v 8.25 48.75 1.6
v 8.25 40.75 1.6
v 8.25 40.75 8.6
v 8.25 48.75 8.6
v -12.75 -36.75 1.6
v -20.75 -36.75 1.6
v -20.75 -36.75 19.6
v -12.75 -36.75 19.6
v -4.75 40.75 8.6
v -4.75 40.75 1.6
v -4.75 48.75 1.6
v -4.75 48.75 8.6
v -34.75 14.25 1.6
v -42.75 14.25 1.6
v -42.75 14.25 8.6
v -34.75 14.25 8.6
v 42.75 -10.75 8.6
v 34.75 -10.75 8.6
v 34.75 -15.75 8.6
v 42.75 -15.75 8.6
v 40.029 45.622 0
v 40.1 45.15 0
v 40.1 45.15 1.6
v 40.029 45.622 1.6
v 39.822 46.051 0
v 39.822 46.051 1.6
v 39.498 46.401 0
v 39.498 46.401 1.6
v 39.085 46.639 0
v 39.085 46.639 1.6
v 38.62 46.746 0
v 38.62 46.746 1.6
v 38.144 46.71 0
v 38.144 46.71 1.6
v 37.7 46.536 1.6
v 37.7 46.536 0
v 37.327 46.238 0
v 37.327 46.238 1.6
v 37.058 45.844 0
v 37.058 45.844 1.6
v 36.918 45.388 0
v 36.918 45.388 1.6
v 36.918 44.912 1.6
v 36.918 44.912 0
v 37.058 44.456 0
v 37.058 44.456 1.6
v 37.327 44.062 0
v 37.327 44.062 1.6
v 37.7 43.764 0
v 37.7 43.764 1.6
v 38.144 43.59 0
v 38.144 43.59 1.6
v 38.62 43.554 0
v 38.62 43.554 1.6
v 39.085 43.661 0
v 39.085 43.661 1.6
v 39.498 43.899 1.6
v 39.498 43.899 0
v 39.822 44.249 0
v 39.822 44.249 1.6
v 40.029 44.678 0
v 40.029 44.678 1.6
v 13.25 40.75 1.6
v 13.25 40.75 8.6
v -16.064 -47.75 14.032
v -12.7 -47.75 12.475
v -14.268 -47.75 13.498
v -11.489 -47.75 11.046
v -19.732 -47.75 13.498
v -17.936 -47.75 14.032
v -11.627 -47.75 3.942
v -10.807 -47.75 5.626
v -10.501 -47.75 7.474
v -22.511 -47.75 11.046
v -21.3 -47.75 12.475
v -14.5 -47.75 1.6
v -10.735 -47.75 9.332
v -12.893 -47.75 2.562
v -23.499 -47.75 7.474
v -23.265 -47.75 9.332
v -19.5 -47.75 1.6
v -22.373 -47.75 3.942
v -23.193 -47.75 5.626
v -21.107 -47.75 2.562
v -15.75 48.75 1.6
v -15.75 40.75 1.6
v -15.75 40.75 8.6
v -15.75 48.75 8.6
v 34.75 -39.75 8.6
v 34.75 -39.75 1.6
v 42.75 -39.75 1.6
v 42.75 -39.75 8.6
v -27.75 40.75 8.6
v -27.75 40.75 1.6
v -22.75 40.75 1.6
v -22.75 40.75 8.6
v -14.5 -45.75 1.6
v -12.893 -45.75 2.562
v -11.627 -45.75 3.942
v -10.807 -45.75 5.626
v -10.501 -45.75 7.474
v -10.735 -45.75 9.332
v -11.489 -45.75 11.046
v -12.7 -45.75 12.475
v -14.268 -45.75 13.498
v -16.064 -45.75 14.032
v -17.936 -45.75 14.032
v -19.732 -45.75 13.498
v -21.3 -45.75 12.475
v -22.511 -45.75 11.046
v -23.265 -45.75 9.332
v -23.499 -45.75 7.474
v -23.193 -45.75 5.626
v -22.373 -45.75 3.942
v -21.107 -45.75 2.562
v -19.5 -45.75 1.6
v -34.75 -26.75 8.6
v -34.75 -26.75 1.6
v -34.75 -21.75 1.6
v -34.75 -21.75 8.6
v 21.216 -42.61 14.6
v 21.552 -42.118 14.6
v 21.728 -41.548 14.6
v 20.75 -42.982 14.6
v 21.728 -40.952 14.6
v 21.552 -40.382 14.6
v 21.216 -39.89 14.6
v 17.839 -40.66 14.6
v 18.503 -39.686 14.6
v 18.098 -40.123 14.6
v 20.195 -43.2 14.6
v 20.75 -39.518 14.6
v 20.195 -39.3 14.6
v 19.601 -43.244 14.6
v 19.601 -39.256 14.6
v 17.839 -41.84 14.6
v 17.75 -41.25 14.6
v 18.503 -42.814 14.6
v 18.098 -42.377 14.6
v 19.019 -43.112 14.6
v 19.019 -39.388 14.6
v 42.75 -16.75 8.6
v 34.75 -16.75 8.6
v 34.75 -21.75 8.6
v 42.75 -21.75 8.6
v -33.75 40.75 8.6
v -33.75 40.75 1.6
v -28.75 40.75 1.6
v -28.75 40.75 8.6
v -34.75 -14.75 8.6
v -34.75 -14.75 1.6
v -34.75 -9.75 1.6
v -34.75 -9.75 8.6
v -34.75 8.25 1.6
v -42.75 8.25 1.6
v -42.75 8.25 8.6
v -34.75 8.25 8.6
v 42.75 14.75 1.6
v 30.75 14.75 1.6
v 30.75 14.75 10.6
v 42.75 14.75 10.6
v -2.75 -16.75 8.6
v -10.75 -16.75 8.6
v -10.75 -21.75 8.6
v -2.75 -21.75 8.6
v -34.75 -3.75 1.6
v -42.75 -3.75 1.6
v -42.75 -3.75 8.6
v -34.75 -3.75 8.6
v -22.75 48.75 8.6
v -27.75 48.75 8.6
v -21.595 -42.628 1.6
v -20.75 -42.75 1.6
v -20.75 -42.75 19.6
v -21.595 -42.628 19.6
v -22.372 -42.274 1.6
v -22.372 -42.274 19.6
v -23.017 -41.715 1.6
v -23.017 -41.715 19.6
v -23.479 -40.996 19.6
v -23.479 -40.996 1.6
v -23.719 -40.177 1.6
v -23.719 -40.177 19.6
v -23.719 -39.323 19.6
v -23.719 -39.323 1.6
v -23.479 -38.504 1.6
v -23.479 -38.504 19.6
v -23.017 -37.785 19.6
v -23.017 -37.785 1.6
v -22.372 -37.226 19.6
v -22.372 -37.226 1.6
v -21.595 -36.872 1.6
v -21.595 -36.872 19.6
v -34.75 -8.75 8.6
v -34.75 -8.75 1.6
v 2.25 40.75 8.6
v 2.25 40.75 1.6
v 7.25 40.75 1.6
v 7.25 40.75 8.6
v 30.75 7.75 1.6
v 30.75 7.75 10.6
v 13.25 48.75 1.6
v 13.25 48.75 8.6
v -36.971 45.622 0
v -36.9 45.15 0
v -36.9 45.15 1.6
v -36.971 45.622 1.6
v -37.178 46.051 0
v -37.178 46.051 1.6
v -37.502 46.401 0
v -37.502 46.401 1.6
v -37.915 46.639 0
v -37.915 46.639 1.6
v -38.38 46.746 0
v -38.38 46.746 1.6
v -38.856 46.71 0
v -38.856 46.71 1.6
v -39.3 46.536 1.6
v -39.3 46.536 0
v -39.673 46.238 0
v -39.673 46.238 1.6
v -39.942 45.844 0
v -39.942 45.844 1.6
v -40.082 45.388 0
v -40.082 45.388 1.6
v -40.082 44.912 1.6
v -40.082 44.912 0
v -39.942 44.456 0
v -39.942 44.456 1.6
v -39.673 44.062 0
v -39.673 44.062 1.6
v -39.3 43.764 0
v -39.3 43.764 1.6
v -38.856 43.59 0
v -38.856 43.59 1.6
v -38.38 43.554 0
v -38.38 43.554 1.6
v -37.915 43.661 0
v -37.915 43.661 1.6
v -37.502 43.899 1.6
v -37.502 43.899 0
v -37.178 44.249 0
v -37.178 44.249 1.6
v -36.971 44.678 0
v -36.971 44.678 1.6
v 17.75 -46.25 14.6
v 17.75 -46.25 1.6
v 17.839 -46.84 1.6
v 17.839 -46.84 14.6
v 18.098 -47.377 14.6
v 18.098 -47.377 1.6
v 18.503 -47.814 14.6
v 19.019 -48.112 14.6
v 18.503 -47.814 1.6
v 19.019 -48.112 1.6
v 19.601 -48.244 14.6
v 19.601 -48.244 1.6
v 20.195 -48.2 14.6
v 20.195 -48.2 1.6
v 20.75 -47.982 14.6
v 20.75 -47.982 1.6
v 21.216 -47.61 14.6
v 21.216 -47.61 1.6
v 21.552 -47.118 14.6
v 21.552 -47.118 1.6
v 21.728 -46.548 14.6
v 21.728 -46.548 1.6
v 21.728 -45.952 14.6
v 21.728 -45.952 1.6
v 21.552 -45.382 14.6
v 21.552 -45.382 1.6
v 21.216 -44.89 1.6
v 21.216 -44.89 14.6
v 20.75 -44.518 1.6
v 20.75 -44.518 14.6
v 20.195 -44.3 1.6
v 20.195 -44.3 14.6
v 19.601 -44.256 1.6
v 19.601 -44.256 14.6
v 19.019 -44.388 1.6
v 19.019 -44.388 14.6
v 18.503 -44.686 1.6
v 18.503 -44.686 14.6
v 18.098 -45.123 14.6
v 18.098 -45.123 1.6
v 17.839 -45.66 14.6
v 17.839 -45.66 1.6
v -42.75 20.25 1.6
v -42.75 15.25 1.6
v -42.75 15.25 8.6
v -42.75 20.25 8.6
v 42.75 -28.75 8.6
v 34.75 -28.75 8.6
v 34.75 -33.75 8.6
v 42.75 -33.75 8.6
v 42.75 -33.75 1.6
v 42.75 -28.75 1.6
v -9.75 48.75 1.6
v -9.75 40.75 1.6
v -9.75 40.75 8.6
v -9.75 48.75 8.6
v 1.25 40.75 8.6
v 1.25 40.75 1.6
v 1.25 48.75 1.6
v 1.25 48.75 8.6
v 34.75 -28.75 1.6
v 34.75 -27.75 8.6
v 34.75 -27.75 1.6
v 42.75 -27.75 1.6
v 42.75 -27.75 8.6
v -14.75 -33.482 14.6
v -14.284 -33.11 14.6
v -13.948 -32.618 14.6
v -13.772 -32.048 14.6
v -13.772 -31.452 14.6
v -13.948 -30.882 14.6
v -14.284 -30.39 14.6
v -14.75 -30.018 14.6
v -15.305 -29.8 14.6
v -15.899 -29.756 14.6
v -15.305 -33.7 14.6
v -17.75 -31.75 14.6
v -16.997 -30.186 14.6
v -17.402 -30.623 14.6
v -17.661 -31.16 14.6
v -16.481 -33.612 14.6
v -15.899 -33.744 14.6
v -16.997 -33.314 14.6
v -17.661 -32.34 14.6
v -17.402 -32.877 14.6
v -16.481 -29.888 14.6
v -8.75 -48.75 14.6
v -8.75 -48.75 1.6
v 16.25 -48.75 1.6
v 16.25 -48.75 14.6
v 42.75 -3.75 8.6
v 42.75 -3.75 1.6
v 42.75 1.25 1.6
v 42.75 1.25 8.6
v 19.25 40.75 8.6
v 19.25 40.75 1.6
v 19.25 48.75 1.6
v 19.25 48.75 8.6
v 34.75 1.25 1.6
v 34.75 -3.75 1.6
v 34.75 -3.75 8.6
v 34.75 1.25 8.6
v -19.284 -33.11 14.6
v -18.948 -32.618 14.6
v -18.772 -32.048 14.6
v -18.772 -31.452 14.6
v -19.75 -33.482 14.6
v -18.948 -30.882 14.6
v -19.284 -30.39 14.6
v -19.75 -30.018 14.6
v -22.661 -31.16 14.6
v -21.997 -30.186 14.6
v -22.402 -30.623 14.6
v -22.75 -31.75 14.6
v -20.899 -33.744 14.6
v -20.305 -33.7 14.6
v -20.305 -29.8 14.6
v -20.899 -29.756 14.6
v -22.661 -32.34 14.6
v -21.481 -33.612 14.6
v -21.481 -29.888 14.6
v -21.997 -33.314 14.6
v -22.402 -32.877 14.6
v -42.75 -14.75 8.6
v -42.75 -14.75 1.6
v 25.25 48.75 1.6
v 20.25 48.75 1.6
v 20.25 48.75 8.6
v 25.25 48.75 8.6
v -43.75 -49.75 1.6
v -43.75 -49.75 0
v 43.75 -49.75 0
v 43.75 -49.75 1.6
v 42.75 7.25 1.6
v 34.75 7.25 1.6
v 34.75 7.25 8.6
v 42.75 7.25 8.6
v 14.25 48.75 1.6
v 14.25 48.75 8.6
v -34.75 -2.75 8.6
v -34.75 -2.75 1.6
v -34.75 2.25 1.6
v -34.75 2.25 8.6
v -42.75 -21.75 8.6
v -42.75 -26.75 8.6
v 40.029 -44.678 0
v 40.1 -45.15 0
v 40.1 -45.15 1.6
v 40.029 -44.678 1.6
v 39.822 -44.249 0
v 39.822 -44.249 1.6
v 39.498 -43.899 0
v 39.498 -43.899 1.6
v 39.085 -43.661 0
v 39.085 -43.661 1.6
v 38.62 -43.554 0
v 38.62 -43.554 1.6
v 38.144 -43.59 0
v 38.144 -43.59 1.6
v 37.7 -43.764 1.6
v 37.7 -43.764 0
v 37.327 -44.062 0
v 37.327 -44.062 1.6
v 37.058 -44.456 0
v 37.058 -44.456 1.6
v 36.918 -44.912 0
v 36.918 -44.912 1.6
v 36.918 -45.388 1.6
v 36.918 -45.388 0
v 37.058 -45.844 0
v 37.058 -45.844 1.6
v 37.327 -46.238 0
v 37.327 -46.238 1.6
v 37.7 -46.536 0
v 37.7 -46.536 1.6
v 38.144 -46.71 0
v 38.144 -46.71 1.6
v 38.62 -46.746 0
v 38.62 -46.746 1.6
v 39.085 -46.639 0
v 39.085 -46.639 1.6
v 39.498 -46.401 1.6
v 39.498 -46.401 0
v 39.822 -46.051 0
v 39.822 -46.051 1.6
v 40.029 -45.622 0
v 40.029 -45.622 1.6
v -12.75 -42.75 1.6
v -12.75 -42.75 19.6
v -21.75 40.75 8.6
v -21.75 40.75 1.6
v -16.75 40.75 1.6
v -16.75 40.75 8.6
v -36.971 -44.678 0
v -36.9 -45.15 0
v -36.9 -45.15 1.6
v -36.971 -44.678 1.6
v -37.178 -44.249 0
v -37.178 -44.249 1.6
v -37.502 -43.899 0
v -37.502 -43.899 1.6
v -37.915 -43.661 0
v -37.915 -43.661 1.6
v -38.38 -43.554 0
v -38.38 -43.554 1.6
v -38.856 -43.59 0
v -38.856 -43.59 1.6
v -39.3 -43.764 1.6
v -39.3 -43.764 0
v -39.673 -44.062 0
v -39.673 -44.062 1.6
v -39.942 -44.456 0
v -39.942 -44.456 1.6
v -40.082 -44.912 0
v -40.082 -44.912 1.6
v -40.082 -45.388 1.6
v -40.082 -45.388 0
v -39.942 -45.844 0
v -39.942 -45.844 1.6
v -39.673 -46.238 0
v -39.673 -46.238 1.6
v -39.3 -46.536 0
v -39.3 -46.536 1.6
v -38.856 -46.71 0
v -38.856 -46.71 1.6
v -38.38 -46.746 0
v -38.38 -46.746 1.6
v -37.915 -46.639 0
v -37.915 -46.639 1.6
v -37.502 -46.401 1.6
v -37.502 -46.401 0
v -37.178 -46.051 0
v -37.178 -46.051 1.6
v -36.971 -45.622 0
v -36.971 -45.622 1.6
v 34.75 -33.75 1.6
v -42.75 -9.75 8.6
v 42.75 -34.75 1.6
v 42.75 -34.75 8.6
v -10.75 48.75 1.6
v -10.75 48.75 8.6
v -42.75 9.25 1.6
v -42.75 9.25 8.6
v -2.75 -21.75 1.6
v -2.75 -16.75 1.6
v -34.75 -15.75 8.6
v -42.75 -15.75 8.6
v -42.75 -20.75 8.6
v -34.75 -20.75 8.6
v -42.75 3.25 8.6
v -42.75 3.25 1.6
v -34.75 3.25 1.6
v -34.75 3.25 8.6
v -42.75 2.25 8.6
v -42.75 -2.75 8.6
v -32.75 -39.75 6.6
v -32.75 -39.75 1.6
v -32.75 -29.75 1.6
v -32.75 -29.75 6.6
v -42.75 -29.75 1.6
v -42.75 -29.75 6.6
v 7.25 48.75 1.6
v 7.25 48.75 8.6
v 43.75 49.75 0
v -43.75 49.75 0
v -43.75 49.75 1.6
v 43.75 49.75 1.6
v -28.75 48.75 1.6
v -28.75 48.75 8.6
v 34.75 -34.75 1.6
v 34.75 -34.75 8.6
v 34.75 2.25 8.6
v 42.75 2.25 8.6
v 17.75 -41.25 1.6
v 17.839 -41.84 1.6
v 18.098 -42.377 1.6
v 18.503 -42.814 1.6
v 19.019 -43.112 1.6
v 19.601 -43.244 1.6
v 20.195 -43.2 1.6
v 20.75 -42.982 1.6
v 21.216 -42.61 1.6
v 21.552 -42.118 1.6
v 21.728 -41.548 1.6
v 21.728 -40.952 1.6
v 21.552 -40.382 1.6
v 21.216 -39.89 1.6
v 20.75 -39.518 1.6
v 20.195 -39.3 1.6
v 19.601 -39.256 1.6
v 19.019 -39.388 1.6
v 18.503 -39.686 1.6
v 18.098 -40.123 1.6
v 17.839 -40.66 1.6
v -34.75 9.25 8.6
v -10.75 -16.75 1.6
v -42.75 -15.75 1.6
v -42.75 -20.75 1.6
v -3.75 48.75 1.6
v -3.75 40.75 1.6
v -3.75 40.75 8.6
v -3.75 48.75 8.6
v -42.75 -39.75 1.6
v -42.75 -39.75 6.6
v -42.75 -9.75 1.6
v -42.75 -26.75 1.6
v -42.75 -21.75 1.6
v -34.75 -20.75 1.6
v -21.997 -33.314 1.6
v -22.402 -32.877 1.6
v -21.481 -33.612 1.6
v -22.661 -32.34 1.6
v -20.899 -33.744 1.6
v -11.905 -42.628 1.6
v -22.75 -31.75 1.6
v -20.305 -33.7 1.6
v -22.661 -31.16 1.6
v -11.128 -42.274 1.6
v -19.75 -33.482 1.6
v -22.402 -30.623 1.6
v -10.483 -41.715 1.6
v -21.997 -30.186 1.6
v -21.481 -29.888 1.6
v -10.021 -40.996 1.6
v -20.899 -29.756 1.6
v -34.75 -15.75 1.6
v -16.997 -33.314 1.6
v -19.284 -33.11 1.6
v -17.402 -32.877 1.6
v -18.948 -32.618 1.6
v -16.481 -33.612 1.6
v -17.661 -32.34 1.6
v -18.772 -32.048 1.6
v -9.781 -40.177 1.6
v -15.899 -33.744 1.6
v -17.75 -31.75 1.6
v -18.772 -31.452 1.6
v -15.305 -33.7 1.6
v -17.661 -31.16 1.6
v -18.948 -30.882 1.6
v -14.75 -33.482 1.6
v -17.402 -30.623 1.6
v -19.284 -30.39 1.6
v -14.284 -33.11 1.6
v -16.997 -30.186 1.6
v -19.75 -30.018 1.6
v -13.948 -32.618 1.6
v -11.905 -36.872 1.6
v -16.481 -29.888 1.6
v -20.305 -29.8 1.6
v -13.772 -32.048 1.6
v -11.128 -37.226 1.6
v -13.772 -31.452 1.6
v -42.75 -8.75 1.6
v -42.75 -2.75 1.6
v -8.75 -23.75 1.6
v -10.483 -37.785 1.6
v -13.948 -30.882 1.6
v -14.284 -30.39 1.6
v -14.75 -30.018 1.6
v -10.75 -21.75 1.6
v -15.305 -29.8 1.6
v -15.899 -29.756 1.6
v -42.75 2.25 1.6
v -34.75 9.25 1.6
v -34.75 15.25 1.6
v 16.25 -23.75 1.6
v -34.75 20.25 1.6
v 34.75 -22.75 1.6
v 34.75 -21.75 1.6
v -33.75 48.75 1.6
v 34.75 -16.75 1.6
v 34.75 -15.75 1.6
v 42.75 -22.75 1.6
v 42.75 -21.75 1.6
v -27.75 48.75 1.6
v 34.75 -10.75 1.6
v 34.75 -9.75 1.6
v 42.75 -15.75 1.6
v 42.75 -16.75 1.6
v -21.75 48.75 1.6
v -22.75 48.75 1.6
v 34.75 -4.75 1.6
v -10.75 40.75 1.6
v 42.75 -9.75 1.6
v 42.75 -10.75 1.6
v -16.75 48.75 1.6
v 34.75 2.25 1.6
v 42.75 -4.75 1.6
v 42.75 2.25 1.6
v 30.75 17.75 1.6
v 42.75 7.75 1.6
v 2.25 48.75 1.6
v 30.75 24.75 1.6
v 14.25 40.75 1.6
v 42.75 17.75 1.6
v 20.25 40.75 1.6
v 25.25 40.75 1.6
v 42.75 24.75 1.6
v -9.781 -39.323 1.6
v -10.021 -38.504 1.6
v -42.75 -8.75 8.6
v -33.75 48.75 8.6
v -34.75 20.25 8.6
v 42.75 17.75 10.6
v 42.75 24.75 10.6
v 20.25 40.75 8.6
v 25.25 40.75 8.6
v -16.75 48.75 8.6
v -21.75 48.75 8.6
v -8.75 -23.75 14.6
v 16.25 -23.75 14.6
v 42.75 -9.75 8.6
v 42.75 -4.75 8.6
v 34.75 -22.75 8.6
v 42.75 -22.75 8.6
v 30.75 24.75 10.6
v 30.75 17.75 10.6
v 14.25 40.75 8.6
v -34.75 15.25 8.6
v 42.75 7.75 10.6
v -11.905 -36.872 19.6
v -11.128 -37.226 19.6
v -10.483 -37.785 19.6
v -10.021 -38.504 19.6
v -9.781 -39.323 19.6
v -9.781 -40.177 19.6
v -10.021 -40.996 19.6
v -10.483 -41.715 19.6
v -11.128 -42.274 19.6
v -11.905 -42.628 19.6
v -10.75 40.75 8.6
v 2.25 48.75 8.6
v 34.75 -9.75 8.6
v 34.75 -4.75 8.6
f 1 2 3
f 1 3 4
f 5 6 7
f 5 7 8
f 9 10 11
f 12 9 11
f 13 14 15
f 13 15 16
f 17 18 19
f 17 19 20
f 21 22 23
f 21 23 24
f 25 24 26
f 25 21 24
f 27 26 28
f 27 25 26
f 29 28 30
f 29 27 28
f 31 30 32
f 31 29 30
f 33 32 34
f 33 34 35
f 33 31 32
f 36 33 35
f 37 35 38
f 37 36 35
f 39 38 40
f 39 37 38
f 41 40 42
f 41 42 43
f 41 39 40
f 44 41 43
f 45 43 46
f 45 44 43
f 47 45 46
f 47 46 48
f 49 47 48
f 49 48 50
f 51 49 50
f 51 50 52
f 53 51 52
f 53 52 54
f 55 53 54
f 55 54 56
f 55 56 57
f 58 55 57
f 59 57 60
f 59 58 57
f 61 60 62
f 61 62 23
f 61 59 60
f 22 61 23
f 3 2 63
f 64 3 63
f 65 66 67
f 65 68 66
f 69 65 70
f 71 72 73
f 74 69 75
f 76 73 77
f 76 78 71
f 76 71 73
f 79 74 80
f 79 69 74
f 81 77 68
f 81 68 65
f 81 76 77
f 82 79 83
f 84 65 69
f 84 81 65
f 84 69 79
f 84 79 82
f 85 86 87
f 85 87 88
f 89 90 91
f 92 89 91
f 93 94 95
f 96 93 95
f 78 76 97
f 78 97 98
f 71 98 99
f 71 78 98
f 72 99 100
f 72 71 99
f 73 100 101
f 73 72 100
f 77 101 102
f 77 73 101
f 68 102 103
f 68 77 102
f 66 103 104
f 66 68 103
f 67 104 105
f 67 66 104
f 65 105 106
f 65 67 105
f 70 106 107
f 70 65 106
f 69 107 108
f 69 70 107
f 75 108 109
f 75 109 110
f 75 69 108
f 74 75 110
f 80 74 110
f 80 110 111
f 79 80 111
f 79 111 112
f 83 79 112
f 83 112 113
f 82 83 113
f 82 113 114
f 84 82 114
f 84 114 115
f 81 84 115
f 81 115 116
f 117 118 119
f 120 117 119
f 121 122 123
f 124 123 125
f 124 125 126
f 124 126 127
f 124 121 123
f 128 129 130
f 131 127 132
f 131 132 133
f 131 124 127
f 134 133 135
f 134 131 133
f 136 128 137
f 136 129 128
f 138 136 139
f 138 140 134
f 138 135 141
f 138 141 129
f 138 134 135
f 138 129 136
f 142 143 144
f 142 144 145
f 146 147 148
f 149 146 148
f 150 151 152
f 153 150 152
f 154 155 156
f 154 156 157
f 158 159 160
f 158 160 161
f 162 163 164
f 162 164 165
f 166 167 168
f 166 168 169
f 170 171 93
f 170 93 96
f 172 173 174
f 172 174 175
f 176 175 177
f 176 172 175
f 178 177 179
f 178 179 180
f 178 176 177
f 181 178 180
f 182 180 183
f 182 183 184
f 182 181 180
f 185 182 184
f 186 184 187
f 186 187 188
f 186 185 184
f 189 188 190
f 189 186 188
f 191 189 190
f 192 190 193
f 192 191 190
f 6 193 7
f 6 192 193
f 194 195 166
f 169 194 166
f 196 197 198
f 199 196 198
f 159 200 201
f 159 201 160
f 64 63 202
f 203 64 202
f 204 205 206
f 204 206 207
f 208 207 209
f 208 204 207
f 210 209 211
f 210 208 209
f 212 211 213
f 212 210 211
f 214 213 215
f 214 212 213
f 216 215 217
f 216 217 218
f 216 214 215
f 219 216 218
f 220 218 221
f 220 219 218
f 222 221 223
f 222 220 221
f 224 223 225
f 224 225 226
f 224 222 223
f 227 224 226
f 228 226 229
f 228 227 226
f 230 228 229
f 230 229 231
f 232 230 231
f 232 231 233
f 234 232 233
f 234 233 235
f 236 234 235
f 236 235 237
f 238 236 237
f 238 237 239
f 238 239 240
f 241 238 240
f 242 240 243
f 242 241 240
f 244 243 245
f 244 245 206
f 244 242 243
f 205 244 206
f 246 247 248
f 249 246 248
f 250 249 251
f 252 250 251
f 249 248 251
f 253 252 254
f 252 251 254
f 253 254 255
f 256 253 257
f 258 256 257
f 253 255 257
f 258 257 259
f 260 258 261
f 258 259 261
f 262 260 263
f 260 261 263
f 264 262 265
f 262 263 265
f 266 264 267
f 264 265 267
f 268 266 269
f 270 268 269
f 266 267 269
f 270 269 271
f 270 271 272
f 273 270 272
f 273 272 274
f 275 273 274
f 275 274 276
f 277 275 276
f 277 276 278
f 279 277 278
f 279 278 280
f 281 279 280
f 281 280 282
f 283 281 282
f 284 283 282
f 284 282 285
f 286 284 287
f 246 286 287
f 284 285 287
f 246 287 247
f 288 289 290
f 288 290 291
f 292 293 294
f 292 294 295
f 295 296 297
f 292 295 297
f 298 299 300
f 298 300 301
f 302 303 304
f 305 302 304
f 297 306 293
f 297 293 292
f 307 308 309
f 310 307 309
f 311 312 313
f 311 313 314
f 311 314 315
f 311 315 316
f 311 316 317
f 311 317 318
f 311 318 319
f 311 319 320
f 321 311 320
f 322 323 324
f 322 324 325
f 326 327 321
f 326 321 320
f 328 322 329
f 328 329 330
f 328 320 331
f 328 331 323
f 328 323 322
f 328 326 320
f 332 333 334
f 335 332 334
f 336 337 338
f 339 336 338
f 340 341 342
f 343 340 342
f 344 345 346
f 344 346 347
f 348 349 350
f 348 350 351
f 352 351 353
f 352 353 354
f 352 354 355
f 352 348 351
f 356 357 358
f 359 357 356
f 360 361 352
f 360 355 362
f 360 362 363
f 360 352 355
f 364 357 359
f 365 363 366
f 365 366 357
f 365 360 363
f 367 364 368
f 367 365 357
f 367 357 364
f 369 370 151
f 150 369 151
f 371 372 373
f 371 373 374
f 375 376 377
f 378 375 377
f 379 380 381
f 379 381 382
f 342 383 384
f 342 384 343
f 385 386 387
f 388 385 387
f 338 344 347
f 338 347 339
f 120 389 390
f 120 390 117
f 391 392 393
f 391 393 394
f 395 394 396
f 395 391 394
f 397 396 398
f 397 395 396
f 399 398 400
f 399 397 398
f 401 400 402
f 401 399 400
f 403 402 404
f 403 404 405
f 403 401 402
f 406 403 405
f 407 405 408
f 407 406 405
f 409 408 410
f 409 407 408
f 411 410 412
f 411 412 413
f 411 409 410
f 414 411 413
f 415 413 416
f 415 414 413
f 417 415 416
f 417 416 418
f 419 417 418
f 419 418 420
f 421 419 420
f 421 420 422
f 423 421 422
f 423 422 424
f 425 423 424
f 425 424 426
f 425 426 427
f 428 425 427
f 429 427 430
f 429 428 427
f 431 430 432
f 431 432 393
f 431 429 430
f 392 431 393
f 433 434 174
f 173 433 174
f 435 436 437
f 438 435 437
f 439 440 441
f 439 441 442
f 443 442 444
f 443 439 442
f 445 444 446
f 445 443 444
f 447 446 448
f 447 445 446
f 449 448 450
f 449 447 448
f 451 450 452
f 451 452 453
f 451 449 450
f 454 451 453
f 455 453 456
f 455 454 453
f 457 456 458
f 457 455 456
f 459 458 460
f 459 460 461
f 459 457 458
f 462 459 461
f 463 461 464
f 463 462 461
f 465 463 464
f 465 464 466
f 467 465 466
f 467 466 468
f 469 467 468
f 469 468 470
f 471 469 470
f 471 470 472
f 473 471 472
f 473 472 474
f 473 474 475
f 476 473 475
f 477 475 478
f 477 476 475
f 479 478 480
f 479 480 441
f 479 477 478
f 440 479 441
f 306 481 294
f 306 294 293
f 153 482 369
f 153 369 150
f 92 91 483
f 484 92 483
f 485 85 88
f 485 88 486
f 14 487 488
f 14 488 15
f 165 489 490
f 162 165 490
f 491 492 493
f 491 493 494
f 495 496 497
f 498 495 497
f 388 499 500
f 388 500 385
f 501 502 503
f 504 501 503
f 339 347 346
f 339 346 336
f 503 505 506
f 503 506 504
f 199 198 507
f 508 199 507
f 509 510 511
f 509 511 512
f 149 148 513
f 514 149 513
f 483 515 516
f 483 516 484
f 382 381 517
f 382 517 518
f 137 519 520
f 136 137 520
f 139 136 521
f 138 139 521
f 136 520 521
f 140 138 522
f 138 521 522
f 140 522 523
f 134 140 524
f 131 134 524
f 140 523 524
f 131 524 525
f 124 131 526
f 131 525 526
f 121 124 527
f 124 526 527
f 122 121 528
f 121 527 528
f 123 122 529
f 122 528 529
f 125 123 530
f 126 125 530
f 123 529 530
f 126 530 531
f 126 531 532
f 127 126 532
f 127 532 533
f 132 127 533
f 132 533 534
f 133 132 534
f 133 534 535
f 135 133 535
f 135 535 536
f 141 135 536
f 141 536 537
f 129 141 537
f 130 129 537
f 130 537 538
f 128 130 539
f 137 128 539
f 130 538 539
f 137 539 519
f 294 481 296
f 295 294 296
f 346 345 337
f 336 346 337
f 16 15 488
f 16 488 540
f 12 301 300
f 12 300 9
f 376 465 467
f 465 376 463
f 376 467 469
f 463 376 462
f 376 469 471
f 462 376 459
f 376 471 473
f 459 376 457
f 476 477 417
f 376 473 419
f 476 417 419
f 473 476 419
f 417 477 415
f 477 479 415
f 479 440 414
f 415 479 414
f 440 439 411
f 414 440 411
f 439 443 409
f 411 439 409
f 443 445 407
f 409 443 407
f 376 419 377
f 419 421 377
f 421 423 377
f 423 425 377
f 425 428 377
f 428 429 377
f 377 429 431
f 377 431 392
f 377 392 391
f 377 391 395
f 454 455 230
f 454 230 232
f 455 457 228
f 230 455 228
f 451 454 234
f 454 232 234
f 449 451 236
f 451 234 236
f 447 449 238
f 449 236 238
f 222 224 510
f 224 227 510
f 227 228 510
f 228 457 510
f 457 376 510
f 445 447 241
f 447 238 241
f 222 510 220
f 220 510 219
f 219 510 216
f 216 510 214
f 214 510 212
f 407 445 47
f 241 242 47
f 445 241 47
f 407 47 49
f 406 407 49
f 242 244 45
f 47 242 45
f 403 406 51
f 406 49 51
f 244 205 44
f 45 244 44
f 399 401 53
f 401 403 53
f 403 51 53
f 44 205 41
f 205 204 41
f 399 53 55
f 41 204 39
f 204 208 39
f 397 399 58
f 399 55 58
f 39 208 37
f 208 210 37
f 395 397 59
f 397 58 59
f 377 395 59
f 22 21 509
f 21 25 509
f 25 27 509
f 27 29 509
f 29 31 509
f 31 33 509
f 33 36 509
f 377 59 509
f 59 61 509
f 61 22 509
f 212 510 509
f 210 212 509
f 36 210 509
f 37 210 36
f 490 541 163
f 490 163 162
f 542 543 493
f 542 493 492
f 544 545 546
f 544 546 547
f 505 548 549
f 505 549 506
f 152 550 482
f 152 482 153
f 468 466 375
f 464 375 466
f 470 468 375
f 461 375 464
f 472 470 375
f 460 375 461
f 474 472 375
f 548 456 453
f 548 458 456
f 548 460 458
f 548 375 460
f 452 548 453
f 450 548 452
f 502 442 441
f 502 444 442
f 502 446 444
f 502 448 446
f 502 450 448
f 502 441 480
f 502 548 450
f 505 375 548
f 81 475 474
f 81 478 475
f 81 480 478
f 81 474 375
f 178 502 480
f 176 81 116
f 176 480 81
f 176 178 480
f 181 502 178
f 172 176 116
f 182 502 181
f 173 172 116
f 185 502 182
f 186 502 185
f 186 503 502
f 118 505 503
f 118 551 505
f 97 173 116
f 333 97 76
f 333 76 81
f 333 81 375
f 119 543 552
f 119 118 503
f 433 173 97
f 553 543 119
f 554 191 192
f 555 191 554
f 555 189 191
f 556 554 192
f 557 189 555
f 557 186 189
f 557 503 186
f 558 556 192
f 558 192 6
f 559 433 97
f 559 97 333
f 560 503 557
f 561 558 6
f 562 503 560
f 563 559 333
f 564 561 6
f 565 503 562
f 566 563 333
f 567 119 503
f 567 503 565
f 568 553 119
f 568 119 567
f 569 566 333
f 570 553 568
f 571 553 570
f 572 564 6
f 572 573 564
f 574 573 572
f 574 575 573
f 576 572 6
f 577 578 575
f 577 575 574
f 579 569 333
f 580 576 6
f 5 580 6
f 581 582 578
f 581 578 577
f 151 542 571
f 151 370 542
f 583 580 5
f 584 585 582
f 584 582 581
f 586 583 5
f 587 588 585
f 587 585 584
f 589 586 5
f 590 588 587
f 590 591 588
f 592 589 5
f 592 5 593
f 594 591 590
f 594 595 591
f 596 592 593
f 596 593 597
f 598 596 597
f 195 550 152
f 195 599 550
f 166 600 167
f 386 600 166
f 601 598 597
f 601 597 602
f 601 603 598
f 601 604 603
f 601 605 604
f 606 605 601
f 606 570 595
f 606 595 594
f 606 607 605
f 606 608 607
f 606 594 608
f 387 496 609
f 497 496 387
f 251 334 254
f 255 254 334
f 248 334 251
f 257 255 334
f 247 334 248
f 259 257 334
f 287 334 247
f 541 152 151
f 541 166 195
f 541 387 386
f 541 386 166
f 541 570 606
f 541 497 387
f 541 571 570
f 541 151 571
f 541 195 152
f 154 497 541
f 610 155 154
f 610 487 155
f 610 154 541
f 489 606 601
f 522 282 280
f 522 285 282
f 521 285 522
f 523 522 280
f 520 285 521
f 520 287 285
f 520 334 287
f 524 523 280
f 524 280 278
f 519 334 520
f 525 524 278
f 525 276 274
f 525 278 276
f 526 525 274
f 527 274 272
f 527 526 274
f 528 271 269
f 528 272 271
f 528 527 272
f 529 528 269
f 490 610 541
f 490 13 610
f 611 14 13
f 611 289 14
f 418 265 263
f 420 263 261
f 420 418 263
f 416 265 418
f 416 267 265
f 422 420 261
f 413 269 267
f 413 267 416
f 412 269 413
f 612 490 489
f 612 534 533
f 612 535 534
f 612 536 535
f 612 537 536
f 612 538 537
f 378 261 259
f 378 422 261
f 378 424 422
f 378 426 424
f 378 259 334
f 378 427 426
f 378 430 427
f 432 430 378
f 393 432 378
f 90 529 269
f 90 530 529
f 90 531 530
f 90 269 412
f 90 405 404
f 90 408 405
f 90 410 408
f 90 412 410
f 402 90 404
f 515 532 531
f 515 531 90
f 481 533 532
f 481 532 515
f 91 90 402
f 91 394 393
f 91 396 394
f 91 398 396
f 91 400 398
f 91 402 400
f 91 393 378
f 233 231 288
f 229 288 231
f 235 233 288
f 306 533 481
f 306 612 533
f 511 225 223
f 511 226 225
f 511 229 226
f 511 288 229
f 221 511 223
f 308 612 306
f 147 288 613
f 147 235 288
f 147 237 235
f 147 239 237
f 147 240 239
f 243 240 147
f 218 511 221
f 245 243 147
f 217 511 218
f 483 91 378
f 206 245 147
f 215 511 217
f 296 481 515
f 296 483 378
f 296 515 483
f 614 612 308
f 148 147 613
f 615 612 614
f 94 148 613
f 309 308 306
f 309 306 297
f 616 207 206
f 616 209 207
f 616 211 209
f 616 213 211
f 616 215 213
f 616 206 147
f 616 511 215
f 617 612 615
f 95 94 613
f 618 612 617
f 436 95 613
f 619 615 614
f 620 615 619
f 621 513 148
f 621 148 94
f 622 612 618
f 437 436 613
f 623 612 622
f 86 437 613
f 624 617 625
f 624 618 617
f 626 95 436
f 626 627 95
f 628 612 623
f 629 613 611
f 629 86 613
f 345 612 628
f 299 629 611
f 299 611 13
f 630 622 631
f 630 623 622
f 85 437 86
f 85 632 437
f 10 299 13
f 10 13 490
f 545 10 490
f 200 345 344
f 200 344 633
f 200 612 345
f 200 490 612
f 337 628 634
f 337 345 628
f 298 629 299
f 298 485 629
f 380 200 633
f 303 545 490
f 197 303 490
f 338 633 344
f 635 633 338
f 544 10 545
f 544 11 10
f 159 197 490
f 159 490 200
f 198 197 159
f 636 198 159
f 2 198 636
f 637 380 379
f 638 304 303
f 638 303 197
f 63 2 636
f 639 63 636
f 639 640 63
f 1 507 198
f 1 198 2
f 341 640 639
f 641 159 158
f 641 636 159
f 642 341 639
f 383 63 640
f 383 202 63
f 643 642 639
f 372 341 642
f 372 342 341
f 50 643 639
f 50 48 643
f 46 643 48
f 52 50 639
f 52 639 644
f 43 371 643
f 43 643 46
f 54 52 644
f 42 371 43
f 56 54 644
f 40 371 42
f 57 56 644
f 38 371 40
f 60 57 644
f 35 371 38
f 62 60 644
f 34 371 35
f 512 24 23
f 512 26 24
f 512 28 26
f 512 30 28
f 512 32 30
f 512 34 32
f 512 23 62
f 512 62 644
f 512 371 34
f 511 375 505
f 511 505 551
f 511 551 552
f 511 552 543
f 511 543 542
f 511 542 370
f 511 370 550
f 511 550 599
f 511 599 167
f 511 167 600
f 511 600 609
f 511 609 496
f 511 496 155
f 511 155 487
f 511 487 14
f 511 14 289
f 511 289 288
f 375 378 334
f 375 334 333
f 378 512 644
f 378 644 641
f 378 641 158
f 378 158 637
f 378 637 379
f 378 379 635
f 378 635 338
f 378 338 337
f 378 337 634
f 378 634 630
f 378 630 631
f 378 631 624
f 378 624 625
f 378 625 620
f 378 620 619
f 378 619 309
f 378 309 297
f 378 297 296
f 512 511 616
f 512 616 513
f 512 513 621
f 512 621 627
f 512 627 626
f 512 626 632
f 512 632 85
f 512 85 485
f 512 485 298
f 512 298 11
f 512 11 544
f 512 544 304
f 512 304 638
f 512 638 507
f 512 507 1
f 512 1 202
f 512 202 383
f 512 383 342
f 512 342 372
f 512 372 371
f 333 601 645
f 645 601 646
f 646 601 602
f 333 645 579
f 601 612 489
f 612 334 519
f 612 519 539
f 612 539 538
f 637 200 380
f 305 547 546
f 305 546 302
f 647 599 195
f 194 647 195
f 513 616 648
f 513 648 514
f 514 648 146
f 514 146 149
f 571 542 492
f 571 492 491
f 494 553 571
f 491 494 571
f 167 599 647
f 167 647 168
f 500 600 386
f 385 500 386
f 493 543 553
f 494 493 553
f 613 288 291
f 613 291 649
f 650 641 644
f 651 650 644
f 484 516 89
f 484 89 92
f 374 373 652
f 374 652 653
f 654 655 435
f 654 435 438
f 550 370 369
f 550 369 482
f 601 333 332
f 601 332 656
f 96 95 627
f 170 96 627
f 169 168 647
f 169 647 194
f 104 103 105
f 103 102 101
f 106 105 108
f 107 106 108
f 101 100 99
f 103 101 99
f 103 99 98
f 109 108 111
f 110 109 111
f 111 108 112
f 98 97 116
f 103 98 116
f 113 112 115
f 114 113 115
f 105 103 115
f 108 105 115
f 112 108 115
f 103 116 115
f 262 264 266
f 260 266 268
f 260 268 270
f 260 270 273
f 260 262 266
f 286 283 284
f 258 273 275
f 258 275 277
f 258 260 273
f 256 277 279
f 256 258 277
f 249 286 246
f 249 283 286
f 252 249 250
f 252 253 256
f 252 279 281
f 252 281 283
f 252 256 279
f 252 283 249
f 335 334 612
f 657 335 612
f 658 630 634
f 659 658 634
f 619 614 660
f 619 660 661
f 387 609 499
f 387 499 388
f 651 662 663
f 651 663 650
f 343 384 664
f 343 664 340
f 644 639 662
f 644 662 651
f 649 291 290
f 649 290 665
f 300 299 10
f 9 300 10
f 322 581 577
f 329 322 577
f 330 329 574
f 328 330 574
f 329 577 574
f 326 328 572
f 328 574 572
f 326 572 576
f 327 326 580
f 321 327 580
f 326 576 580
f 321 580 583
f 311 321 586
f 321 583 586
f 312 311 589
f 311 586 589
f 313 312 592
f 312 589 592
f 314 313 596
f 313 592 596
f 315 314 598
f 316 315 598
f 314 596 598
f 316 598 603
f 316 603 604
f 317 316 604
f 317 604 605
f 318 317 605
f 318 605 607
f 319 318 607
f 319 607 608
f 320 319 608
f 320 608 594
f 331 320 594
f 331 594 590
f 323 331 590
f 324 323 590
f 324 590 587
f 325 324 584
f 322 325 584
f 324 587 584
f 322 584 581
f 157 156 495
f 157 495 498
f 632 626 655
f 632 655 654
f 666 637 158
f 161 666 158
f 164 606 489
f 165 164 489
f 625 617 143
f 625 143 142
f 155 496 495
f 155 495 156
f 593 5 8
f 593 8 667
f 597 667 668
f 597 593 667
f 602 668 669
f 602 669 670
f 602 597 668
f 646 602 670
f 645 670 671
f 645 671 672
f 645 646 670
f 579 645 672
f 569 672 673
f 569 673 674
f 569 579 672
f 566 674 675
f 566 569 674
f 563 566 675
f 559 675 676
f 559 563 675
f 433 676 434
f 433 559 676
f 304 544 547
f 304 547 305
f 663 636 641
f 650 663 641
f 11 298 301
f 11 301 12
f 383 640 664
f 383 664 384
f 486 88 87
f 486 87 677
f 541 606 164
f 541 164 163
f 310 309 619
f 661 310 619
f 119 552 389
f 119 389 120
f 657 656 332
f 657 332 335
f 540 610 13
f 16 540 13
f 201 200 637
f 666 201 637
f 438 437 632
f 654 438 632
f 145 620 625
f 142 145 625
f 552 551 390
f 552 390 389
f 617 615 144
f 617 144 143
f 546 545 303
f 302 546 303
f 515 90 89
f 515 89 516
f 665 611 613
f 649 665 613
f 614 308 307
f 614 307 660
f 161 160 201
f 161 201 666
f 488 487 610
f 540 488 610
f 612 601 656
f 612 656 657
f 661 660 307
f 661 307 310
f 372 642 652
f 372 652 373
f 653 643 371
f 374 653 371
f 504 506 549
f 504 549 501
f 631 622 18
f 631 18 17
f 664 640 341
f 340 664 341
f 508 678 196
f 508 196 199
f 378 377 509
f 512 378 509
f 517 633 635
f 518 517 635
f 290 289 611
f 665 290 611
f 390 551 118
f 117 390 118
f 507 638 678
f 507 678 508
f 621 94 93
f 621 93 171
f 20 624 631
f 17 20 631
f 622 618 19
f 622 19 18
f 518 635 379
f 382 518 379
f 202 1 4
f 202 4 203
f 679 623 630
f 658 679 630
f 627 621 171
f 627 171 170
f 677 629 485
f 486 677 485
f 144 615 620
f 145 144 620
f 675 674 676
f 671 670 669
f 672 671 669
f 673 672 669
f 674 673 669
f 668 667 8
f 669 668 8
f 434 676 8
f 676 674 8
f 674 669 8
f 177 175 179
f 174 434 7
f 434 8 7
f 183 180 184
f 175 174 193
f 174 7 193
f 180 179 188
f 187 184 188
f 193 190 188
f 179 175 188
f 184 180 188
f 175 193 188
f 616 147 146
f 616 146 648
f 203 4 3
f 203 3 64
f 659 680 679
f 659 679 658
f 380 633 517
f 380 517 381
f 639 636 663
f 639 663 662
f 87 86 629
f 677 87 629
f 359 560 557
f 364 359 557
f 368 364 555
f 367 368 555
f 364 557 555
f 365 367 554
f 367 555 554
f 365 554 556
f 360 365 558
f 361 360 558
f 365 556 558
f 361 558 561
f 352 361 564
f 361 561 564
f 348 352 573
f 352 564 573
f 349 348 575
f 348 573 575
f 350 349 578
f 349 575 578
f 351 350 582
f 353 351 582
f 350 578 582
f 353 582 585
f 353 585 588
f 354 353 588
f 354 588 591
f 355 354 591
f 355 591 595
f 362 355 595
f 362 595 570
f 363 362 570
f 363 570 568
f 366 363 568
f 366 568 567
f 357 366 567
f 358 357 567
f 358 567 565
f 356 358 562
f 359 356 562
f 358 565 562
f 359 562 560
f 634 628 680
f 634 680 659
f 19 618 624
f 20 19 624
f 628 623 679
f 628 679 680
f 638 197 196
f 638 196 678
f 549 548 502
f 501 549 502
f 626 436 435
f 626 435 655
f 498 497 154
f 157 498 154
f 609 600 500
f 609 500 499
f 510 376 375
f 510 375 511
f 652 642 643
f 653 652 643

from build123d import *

# Parameters (mm, degrees)
SKETCH_1_W      = 87.5
SKETCH_1_H      = 99.5
SKETCH_1_R      = 1.6
EXTRUDE_1_DEPTH = 1.6
SKETCH_2_W      = 10
SKETCH_2_H      = 10
EXTRUDE_2_DEPTH = 5
SKETCH_3_W      = 25
SKETCH_3_H      = 25
EXTRUDE_3_DEPTH = 13
SKETCH_4_W      = 5
SKETCH_4_H      = 8
SKETCH_4_W_2    = 8
SKETCH_4_H_2    = 5
EXTRUDE_4_DEPTH = 7
SKETCH_5_W      = 12
SKETCH_5_H      = 7
EXTRUDE_5_DEPTH = 9
EXTRUDE_6_DEPTH = 18
SKETCH_7_R      = 2
EXTRUDE_7_DEPTH = 13
SKETCH_8_R      = 6.5
EXTRUDE_8_DEPTH = 2


with BuildPart() as part:
    # 草图1 → 凸台-拉伸1 (new body)
    with BuildSketch(Plane.XY):
        Rectangle(SKETCH_1_W, SKETCH_1_H)
        with Locations((-38.5, 45.15)):
            Circle(SKETCH_1_R, mode=Mode.SUBTRACT)
        with Locations((38.5, 45.15)):
            Circle(SKETCH_1_R, mode=Mode.SUBTRACT)
        with Locations((-38.5, -45.15)):
            Circle(SKETCH_1_R, mode=Mode.SUBTRACT)
        with Locations((38.5, -45.15)):
            Circle(SKETCH_1_R, mode=Mode.SUBTRACT)
    extrude(amount=EXTRUDE_1_DEPTH)

    # 草图2 → 凸台-拉伸2 (add)
    with BuildSketch(Plane.XY.offset(1.6)):
        with Locations((-37.75, -34.75)):
            Rectangle(SKETCH_2_W, SKETCH_2_H)
    extrude(amount=EXTRUDE_2_DEPTH)

    # 草图3 → 凸台-拉伸3 (add)
    with BuildSketch(Plane.XY.offset(1.6)):
        with Locations((3.75, -36.25)):
            Rectangle(SKETCH_3_W, SKETCH_3_H)
    extrude(amount=EXTRUDE_3_DEPTH)

    # 草图4 → 凸台-拉伸4 (add)
    with BuildSketch(Plane.XY.offset(1.6)):
        with Locations((-31.25, 44.75)):
            Rectangle(SKETCH_4_W, SKETCH_4_H)
        with Locations((-25.25, 44.75)):
            Rectangle(SKETCH_4_W, SKETCH_4_H)
        with Locations((-19.25, 44.75)):
            Rectangle(SKETCH_4_W, SKETCH_4_H)
        with Locations((-13.25, 44.75)):
            Rectangle(SKETCH_4_W, SKETCH_4_H)
        with Locations((-7.25, 44.75)):
            Rectangle(SKETCH_4_W, SKETCH_4_H)
        with Locations((-1.25, 44.75)):
            Rectangle(SKETCH_4_W, SKETCH_4_H)
        with Locations((4.75, 44.75)):
            Rectangle(SKETCH_4_W, SKETCH_4_H)
        with Locations((10.75, 44.75)):
            Rectangle(SKETCH_4_W, SKETCH_4_H)
        with Locations((16.75, 44.75)):
            Rectangle(SKETCH_4_W, SKETCH_4_H)
        with Locations((22.75, 44.75)):
            Rectangle(SKETCH_4_W, SKETCH_4_H)
        with Locations((-38.75, -24.25)):
            Rectangle(SKETCH_4_W_2, SKETCH_4_H_2)
        with Locations((-38.75, -18.25)):
            Rectangle(SKETCH_4_W_2, SKETCH_4_H_2)
        with Locations((-38.75, -12.25)):
            Rectangle(SKETCH_4_W_2, SKETCH_4_H_2)
        with Locations((-38.75, -6.25)):
            Rectangle(SKETCH_4_W_2, SKETCH_4_H_2)
        with Locations((-38.75, -0.25)):
            Rectangle(SKETCH_4_W_2, SKETCH_4_H_2)
        with Locations((-38.75, 5.75)):
            Rectangle(SKETCH_4_W_2, SKETCH_4_H_2)
        with Locations((-38.75, 11.75)):
            Rectangle(SKETCH_4_W_2, SKETCH_4_H_2)
        with Locations((-38.75, 17.75)):
            Rectangle(SKETCH_4_W_2, SKETCH_4_H_2)
        with Locations((38.75, -37.25)):
            Rectangle(SKETCH_4_W_2, SKETCH_4_H_2)
        with Locations((38.75, -31.25)):
            Rectangle(SKETCH_4_W_2, SKETCH_4_H_2)
        with Locations((38.75, -25.25)):
            Rectangle(SKETCH_4_W_2, SKETCH_4_H_2)
        with Locations((38.75, -19.25)):
            Rectangle(SKETCH_4_W_2, SKETCH_4_H_2)
        with Locations((38.75, -13.25)):
            Rectangle(SKETCH_4_W_2, SKETCH_4_H_2)
        with Locations((38.75, -7.25)):
            Rectangle(SKETCH_4_W_2, SKETCH_4_H_2)
        with Locations((38.75, -1.25)):
            Rectangle(SKETCH_4_W_2, SKETCH_4_H_2)
        with Locations((38.75, 4.75)):
            Rectangle(SKETCH_4_W_2, SKETCH_4_H_2)
        with Locations((-6.75, -19.25)):
            Rectangle(SKETCH_4_W_2, SKETCH_4_H_2)
    extrude(amount=EXTRUDE_4_DEPTH)

    # 草图5 → 凸台-拉伸5 (add)
    with BuildSketch(Plane.XY.offset(1.6)):
        with Locations((36.75, 11.25)):
            Rectangle(SKETCH_5_W, SKETCH_5_H)
        with Locations((36.75, 21.25)):
            Rectangle(SKETCH_5_W, SKETCH_5_H)
    extrude(amount=EXTRUDE_5_DEPTH)

    # 草图6 → 凸台-拉伸6 (add)
    with BuildSketch(Plane.XY.offset(1.6)):
        with BuildLine():
            Line((-20.75, -36.75), (-12.75, -36.75))
            ThreePointArc((-12.75, -36.75), (-9.75, -39.75), (-12.75, -42.75))
            Line((-12.75, -42.75), (-20.75, -42.75))
            ThreePointArc((-20.75, -42.75), (-23.75, -39.75), (-20.75, -36.75))
        make_face()
    extrude(amount=EXTRUDE_6_DEPTH)

    # 草图7 → 凸台-拉伸7 (add)
    with BuildSketch(Plane.XY.offset(1.6)):
        with Locations(Location((-20.75, -31.75, 0), (0, 0, 180))):
            Circle(SKETCH_7_R)
        with Locations(Location((-15.75, -31.75, 0), (0, 0, 180))):
            Circle(SKETCH_7_R)
        with Locations(Location((19.75, -41.25, 0), (0, 0, 180))):
            Circle(SKETCH_7_R)
        with Locations(Location((19.75, -46.25, 0), (0, 0, 180))):
            Circle(SKETCH_7_R)
    extrude(amount=EXTRUDE_7_DEPTH)

    # 草图8 → 凸台-拉伸8 (add)
    with BuildSketch(Plane(origin=(0, -47.75, 0), x_dir=(-1, 0, 0), z_dir=(0, -1, 0))):
        with Locations((17, -7.6)):
            Circle(SKETCH_8_R)
    extrude(amount=-EXTRUDE_8_DEPTH)


solid = part.part
